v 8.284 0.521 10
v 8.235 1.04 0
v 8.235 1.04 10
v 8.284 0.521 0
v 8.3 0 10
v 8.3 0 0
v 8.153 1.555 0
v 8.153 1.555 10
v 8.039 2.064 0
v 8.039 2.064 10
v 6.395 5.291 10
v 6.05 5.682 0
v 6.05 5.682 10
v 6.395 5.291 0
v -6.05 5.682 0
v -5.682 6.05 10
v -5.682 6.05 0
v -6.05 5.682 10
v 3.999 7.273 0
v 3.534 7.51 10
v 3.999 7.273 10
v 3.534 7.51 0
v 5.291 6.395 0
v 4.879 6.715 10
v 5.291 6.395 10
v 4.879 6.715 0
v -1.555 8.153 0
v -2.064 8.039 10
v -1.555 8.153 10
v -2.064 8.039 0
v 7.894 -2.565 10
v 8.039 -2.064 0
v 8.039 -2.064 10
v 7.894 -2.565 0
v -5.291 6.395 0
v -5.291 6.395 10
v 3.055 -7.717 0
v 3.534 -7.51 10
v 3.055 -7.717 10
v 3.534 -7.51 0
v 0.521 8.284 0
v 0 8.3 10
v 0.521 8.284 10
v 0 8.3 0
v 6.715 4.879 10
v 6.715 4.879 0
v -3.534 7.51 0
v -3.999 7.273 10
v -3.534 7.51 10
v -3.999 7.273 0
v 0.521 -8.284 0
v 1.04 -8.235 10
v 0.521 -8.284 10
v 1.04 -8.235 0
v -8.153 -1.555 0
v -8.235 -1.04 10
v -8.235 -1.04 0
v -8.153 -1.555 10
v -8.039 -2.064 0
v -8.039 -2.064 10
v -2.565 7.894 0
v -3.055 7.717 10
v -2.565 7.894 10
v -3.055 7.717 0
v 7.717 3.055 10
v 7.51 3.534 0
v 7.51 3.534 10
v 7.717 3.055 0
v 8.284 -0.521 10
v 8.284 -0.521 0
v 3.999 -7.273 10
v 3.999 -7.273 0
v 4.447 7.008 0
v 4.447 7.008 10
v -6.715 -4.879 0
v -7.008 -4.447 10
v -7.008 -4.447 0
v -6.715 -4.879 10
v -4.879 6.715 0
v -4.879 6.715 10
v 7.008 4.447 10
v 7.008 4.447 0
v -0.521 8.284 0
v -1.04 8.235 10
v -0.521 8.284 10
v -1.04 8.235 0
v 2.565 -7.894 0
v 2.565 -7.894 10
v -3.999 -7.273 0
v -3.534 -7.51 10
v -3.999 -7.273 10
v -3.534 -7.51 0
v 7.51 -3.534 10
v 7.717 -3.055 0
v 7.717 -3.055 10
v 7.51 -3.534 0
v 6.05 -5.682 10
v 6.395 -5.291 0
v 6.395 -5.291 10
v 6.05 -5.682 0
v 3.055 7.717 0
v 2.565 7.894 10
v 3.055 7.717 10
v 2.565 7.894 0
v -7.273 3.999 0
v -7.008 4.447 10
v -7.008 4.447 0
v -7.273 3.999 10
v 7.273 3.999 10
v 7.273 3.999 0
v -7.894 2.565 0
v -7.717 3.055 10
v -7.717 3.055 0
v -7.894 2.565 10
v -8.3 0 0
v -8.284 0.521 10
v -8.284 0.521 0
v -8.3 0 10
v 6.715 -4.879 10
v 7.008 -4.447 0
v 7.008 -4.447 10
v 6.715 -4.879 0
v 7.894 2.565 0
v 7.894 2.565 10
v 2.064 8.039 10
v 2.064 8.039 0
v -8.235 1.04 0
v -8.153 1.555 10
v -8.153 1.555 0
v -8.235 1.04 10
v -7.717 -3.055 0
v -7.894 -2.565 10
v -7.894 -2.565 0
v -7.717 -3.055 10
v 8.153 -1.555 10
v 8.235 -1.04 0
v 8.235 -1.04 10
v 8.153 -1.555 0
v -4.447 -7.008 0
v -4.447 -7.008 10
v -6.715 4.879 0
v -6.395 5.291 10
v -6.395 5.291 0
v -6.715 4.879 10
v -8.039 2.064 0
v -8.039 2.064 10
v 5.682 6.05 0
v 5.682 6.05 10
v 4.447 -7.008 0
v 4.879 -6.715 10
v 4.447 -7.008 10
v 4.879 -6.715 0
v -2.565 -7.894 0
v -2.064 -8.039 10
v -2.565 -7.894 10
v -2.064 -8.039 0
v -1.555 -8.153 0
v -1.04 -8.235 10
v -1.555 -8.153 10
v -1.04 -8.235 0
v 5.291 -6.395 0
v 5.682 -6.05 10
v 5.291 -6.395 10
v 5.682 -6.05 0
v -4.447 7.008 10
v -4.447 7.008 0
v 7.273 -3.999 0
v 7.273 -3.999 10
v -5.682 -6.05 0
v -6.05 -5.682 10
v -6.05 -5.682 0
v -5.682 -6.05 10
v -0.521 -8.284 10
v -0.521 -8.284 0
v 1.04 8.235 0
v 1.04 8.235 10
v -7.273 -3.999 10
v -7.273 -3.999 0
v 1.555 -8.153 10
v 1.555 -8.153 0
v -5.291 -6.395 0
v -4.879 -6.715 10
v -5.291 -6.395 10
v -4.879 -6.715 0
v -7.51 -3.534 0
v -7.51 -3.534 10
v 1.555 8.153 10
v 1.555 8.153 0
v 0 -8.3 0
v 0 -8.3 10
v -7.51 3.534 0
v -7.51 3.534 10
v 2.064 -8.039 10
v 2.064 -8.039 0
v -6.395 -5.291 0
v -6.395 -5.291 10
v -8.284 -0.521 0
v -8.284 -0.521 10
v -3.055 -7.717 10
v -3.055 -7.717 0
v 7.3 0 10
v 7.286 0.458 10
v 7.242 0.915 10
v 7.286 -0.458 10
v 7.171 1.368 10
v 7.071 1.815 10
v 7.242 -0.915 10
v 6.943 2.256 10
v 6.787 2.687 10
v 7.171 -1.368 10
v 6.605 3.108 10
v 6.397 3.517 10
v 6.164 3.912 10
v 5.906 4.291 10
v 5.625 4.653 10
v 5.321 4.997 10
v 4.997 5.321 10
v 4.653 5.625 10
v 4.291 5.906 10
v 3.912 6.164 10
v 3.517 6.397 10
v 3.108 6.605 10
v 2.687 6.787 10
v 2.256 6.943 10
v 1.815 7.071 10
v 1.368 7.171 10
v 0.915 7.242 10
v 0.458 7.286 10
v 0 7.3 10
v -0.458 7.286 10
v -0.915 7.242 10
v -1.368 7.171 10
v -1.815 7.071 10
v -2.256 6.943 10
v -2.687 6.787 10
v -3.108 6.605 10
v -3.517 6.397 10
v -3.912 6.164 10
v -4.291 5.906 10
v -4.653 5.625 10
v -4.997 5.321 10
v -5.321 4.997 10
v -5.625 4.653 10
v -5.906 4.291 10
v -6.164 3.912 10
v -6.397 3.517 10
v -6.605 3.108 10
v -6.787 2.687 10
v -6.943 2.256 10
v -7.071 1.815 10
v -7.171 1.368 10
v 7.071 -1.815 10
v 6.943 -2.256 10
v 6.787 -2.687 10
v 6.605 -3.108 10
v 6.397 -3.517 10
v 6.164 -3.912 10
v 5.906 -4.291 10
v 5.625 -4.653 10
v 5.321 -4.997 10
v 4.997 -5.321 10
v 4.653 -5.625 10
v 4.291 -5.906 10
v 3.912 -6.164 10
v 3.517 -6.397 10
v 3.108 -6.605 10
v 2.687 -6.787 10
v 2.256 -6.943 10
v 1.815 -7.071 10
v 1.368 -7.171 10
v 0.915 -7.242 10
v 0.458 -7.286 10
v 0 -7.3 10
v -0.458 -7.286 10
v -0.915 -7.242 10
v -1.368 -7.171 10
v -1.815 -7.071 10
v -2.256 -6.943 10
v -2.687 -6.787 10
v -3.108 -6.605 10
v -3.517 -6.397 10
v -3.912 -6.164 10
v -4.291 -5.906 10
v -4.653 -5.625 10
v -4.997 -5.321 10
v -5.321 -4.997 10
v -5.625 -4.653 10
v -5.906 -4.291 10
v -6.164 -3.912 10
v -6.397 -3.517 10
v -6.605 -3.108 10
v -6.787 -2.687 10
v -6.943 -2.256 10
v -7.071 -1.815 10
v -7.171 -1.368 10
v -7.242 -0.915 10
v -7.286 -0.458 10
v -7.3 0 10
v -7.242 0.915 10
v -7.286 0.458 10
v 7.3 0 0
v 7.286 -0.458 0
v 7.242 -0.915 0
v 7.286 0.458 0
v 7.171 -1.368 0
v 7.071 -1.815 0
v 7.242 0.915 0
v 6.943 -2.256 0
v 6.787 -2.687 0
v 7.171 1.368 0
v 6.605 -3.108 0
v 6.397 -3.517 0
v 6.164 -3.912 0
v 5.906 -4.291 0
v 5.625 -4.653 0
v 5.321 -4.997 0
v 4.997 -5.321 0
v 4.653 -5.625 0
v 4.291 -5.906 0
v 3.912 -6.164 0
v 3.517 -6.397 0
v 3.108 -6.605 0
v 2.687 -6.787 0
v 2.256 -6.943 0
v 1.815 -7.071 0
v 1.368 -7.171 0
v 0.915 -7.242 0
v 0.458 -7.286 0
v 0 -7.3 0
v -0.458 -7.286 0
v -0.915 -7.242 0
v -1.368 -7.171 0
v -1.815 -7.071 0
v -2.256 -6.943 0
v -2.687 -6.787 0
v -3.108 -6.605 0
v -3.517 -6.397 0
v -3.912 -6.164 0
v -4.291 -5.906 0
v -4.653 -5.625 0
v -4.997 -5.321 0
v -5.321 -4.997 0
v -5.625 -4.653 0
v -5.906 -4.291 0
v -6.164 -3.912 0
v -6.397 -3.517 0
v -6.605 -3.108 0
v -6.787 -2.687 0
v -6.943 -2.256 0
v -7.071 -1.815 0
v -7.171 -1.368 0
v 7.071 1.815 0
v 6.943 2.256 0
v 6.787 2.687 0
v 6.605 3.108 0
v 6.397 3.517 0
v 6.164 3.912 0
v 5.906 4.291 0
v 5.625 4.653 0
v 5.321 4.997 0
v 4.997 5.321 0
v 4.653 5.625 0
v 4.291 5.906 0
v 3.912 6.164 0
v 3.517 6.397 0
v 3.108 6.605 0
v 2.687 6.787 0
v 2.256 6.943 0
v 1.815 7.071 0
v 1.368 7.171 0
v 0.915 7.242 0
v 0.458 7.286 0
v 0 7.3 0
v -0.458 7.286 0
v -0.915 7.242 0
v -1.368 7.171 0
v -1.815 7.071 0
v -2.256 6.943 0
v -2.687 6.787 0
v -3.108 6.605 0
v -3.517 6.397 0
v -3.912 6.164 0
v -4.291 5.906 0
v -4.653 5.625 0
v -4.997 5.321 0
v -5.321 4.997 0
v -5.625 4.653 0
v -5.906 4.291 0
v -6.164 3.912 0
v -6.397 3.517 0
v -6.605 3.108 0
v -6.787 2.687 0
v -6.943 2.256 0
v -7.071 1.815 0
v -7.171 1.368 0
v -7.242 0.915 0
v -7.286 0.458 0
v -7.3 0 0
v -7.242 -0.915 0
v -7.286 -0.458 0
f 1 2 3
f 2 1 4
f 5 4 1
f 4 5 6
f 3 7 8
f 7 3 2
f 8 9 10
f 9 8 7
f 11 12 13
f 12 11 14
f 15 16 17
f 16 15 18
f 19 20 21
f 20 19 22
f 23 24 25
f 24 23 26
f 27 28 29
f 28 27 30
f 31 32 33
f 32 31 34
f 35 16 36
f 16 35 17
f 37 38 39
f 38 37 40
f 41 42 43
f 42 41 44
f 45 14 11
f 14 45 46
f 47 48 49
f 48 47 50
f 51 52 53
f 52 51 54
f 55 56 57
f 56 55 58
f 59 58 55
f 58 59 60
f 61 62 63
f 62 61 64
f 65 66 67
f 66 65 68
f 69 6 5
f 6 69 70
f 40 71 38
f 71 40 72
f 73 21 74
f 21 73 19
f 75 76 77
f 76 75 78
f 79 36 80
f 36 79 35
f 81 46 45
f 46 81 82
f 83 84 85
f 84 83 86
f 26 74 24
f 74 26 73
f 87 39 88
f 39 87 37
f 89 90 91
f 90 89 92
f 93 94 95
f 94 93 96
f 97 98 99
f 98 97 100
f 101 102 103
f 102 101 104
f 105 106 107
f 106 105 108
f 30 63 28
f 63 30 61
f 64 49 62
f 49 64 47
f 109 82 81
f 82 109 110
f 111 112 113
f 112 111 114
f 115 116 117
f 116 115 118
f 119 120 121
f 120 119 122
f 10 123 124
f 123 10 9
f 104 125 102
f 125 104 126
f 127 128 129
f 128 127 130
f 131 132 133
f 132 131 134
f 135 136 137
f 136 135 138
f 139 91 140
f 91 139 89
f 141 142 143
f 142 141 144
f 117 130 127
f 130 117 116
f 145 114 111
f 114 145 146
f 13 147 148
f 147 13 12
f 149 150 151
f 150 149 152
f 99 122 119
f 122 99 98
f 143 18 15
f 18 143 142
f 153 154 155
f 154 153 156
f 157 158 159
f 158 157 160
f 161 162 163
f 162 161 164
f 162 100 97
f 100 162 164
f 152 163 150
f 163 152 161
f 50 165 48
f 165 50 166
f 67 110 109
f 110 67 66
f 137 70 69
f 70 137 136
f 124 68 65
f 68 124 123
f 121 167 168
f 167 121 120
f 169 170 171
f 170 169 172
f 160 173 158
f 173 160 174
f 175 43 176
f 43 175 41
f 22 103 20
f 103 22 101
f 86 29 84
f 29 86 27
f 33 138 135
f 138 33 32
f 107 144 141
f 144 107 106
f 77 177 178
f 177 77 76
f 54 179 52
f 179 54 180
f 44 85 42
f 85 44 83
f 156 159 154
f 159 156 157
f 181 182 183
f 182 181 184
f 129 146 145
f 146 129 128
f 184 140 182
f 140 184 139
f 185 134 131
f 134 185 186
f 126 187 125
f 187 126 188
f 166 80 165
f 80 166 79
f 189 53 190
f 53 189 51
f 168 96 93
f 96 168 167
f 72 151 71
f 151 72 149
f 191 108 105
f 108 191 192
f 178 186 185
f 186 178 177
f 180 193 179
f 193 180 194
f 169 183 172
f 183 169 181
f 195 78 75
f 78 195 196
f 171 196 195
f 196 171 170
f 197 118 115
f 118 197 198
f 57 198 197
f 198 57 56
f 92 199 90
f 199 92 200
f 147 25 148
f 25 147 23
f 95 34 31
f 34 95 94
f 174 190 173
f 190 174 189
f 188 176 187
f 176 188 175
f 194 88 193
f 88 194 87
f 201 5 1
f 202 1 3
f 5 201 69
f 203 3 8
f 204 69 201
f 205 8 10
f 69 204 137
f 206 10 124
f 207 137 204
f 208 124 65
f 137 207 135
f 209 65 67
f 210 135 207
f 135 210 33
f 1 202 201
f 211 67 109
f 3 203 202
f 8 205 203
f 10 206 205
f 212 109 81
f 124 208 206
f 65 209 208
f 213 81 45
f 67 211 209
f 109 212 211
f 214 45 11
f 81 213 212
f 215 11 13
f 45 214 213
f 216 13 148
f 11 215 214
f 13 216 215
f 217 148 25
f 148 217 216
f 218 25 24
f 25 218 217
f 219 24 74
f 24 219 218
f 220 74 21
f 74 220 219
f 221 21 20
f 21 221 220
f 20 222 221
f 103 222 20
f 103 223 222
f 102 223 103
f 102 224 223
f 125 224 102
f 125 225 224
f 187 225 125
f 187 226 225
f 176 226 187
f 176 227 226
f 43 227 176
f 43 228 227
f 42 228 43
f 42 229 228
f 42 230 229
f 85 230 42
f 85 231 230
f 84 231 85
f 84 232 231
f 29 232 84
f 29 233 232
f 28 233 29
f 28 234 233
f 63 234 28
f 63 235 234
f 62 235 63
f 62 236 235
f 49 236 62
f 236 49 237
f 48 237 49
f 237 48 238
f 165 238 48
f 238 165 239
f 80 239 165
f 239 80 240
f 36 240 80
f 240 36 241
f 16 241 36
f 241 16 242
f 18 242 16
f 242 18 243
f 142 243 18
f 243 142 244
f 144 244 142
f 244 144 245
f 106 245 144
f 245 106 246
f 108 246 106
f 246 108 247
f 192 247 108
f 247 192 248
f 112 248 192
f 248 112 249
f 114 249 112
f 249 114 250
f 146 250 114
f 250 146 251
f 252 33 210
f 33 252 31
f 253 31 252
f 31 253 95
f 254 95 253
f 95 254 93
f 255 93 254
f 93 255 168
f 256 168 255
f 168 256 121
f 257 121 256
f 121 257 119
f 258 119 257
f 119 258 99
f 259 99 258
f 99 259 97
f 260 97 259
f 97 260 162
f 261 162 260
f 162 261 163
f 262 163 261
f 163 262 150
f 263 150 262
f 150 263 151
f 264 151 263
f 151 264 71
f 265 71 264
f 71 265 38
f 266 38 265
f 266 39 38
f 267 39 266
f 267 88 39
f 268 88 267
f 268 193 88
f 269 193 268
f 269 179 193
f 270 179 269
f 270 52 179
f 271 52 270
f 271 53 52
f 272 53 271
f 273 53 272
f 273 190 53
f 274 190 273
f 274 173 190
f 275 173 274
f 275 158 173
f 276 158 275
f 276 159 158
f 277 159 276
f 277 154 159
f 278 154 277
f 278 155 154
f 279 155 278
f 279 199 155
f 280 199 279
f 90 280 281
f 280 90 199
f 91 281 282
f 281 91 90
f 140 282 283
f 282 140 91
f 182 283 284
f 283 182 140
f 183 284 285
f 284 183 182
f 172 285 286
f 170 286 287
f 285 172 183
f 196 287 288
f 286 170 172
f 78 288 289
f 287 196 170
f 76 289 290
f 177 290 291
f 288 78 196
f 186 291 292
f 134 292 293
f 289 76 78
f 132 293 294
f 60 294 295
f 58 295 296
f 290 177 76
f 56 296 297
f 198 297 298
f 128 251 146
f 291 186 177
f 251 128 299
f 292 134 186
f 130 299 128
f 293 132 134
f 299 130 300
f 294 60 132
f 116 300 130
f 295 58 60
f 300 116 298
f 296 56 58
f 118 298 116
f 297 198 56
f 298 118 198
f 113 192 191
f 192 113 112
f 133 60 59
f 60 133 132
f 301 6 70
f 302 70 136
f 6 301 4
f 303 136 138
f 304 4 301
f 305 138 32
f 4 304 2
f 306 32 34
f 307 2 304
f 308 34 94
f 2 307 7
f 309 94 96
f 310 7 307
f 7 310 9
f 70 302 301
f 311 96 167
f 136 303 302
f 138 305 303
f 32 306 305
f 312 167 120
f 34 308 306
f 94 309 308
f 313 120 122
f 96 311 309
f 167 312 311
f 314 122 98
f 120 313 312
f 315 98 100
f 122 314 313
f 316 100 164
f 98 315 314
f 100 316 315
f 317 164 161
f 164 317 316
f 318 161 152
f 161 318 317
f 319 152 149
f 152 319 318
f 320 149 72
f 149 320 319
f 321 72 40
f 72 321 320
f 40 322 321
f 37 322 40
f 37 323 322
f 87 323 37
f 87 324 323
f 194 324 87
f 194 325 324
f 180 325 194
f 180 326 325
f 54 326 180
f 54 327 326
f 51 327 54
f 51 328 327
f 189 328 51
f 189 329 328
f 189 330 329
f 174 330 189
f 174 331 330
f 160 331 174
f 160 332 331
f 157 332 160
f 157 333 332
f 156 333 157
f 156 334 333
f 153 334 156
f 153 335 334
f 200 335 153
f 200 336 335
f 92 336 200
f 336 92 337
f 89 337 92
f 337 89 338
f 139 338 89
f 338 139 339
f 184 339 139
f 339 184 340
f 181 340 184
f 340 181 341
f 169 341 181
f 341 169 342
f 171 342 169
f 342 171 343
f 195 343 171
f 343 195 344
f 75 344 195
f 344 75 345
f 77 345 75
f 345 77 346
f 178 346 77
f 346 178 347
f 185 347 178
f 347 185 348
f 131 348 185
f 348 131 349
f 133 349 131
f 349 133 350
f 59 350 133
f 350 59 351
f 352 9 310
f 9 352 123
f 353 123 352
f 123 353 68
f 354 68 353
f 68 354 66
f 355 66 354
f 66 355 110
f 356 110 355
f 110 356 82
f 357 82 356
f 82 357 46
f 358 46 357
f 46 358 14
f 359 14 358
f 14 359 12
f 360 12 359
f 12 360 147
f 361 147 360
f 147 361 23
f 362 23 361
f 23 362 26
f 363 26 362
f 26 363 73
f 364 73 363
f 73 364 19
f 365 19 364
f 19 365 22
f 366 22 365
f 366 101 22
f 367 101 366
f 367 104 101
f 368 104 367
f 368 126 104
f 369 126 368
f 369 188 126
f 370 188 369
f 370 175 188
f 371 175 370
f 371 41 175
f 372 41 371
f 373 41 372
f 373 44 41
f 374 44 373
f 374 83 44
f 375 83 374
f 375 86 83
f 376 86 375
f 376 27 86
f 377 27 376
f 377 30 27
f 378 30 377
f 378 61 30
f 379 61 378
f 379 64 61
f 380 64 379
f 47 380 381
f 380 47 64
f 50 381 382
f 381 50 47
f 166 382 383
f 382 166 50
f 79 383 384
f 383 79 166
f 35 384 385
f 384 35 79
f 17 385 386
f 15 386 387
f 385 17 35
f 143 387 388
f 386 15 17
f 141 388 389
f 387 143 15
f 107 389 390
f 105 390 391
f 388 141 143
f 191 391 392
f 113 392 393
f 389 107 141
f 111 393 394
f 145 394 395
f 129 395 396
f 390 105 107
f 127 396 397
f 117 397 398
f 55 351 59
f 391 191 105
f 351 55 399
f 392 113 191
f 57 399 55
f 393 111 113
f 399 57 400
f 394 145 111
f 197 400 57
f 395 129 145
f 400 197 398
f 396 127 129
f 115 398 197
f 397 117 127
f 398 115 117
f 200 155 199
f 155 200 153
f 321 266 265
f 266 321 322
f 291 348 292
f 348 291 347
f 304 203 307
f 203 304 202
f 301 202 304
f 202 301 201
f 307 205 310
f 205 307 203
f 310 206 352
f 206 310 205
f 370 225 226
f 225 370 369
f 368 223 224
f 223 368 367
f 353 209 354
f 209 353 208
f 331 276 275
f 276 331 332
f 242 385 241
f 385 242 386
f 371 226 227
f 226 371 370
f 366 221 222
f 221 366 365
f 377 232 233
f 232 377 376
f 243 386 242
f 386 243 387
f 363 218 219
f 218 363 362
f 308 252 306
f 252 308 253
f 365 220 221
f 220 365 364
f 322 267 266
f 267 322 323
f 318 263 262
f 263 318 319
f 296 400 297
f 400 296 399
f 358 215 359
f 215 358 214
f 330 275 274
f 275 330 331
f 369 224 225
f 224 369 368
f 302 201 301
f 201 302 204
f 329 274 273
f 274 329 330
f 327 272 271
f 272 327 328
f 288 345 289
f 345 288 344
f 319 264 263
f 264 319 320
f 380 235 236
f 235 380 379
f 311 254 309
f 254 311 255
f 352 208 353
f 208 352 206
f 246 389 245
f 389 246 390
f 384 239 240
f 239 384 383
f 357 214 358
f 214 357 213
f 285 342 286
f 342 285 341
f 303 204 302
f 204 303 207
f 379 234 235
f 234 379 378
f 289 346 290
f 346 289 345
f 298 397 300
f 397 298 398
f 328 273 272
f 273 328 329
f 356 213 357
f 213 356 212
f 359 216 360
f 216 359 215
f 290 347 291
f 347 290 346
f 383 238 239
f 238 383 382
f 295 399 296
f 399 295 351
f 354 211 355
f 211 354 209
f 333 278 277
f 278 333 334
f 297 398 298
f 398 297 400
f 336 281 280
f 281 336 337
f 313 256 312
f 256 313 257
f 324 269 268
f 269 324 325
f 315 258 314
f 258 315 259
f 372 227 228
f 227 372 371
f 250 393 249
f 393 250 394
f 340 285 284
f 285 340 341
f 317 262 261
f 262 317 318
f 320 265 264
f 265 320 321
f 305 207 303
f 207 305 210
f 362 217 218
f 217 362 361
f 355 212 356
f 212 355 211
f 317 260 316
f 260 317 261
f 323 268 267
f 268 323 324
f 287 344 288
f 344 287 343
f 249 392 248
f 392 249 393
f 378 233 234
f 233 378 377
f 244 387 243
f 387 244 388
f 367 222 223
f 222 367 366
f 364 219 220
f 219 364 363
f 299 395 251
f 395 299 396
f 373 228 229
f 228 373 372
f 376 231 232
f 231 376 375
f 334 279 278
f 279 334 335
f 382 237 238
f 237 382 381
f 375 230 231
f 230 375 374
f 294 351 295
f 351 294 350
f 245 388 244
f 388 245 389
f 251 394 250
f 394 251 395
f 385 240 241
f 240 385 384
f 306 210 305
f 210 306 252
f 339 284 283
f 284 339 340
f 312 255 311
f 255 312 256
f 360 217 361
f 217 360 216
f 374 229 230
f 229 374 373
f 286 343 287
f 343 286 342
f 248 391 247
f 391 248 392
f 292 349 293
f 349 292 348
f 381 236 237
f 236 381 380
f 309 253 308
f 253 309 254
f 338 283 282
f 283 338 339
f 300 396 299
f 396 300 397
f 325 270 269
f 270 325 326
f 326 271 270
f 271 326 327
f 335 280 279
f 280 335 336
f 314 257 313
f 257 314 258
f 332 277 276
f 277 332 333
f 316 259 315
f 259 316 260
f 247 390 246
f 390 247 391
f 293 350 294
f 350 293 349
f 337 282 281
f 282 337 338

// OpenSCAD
$fn = 100;

d = 14.6;
r = d/2;
R = r+1;
h = 10;
E = 0.01;

difference() {
    cylinder(r=R, h=h);
    translate([0,0,-E]) cylinder(r=r, h=h+2*E);
}
